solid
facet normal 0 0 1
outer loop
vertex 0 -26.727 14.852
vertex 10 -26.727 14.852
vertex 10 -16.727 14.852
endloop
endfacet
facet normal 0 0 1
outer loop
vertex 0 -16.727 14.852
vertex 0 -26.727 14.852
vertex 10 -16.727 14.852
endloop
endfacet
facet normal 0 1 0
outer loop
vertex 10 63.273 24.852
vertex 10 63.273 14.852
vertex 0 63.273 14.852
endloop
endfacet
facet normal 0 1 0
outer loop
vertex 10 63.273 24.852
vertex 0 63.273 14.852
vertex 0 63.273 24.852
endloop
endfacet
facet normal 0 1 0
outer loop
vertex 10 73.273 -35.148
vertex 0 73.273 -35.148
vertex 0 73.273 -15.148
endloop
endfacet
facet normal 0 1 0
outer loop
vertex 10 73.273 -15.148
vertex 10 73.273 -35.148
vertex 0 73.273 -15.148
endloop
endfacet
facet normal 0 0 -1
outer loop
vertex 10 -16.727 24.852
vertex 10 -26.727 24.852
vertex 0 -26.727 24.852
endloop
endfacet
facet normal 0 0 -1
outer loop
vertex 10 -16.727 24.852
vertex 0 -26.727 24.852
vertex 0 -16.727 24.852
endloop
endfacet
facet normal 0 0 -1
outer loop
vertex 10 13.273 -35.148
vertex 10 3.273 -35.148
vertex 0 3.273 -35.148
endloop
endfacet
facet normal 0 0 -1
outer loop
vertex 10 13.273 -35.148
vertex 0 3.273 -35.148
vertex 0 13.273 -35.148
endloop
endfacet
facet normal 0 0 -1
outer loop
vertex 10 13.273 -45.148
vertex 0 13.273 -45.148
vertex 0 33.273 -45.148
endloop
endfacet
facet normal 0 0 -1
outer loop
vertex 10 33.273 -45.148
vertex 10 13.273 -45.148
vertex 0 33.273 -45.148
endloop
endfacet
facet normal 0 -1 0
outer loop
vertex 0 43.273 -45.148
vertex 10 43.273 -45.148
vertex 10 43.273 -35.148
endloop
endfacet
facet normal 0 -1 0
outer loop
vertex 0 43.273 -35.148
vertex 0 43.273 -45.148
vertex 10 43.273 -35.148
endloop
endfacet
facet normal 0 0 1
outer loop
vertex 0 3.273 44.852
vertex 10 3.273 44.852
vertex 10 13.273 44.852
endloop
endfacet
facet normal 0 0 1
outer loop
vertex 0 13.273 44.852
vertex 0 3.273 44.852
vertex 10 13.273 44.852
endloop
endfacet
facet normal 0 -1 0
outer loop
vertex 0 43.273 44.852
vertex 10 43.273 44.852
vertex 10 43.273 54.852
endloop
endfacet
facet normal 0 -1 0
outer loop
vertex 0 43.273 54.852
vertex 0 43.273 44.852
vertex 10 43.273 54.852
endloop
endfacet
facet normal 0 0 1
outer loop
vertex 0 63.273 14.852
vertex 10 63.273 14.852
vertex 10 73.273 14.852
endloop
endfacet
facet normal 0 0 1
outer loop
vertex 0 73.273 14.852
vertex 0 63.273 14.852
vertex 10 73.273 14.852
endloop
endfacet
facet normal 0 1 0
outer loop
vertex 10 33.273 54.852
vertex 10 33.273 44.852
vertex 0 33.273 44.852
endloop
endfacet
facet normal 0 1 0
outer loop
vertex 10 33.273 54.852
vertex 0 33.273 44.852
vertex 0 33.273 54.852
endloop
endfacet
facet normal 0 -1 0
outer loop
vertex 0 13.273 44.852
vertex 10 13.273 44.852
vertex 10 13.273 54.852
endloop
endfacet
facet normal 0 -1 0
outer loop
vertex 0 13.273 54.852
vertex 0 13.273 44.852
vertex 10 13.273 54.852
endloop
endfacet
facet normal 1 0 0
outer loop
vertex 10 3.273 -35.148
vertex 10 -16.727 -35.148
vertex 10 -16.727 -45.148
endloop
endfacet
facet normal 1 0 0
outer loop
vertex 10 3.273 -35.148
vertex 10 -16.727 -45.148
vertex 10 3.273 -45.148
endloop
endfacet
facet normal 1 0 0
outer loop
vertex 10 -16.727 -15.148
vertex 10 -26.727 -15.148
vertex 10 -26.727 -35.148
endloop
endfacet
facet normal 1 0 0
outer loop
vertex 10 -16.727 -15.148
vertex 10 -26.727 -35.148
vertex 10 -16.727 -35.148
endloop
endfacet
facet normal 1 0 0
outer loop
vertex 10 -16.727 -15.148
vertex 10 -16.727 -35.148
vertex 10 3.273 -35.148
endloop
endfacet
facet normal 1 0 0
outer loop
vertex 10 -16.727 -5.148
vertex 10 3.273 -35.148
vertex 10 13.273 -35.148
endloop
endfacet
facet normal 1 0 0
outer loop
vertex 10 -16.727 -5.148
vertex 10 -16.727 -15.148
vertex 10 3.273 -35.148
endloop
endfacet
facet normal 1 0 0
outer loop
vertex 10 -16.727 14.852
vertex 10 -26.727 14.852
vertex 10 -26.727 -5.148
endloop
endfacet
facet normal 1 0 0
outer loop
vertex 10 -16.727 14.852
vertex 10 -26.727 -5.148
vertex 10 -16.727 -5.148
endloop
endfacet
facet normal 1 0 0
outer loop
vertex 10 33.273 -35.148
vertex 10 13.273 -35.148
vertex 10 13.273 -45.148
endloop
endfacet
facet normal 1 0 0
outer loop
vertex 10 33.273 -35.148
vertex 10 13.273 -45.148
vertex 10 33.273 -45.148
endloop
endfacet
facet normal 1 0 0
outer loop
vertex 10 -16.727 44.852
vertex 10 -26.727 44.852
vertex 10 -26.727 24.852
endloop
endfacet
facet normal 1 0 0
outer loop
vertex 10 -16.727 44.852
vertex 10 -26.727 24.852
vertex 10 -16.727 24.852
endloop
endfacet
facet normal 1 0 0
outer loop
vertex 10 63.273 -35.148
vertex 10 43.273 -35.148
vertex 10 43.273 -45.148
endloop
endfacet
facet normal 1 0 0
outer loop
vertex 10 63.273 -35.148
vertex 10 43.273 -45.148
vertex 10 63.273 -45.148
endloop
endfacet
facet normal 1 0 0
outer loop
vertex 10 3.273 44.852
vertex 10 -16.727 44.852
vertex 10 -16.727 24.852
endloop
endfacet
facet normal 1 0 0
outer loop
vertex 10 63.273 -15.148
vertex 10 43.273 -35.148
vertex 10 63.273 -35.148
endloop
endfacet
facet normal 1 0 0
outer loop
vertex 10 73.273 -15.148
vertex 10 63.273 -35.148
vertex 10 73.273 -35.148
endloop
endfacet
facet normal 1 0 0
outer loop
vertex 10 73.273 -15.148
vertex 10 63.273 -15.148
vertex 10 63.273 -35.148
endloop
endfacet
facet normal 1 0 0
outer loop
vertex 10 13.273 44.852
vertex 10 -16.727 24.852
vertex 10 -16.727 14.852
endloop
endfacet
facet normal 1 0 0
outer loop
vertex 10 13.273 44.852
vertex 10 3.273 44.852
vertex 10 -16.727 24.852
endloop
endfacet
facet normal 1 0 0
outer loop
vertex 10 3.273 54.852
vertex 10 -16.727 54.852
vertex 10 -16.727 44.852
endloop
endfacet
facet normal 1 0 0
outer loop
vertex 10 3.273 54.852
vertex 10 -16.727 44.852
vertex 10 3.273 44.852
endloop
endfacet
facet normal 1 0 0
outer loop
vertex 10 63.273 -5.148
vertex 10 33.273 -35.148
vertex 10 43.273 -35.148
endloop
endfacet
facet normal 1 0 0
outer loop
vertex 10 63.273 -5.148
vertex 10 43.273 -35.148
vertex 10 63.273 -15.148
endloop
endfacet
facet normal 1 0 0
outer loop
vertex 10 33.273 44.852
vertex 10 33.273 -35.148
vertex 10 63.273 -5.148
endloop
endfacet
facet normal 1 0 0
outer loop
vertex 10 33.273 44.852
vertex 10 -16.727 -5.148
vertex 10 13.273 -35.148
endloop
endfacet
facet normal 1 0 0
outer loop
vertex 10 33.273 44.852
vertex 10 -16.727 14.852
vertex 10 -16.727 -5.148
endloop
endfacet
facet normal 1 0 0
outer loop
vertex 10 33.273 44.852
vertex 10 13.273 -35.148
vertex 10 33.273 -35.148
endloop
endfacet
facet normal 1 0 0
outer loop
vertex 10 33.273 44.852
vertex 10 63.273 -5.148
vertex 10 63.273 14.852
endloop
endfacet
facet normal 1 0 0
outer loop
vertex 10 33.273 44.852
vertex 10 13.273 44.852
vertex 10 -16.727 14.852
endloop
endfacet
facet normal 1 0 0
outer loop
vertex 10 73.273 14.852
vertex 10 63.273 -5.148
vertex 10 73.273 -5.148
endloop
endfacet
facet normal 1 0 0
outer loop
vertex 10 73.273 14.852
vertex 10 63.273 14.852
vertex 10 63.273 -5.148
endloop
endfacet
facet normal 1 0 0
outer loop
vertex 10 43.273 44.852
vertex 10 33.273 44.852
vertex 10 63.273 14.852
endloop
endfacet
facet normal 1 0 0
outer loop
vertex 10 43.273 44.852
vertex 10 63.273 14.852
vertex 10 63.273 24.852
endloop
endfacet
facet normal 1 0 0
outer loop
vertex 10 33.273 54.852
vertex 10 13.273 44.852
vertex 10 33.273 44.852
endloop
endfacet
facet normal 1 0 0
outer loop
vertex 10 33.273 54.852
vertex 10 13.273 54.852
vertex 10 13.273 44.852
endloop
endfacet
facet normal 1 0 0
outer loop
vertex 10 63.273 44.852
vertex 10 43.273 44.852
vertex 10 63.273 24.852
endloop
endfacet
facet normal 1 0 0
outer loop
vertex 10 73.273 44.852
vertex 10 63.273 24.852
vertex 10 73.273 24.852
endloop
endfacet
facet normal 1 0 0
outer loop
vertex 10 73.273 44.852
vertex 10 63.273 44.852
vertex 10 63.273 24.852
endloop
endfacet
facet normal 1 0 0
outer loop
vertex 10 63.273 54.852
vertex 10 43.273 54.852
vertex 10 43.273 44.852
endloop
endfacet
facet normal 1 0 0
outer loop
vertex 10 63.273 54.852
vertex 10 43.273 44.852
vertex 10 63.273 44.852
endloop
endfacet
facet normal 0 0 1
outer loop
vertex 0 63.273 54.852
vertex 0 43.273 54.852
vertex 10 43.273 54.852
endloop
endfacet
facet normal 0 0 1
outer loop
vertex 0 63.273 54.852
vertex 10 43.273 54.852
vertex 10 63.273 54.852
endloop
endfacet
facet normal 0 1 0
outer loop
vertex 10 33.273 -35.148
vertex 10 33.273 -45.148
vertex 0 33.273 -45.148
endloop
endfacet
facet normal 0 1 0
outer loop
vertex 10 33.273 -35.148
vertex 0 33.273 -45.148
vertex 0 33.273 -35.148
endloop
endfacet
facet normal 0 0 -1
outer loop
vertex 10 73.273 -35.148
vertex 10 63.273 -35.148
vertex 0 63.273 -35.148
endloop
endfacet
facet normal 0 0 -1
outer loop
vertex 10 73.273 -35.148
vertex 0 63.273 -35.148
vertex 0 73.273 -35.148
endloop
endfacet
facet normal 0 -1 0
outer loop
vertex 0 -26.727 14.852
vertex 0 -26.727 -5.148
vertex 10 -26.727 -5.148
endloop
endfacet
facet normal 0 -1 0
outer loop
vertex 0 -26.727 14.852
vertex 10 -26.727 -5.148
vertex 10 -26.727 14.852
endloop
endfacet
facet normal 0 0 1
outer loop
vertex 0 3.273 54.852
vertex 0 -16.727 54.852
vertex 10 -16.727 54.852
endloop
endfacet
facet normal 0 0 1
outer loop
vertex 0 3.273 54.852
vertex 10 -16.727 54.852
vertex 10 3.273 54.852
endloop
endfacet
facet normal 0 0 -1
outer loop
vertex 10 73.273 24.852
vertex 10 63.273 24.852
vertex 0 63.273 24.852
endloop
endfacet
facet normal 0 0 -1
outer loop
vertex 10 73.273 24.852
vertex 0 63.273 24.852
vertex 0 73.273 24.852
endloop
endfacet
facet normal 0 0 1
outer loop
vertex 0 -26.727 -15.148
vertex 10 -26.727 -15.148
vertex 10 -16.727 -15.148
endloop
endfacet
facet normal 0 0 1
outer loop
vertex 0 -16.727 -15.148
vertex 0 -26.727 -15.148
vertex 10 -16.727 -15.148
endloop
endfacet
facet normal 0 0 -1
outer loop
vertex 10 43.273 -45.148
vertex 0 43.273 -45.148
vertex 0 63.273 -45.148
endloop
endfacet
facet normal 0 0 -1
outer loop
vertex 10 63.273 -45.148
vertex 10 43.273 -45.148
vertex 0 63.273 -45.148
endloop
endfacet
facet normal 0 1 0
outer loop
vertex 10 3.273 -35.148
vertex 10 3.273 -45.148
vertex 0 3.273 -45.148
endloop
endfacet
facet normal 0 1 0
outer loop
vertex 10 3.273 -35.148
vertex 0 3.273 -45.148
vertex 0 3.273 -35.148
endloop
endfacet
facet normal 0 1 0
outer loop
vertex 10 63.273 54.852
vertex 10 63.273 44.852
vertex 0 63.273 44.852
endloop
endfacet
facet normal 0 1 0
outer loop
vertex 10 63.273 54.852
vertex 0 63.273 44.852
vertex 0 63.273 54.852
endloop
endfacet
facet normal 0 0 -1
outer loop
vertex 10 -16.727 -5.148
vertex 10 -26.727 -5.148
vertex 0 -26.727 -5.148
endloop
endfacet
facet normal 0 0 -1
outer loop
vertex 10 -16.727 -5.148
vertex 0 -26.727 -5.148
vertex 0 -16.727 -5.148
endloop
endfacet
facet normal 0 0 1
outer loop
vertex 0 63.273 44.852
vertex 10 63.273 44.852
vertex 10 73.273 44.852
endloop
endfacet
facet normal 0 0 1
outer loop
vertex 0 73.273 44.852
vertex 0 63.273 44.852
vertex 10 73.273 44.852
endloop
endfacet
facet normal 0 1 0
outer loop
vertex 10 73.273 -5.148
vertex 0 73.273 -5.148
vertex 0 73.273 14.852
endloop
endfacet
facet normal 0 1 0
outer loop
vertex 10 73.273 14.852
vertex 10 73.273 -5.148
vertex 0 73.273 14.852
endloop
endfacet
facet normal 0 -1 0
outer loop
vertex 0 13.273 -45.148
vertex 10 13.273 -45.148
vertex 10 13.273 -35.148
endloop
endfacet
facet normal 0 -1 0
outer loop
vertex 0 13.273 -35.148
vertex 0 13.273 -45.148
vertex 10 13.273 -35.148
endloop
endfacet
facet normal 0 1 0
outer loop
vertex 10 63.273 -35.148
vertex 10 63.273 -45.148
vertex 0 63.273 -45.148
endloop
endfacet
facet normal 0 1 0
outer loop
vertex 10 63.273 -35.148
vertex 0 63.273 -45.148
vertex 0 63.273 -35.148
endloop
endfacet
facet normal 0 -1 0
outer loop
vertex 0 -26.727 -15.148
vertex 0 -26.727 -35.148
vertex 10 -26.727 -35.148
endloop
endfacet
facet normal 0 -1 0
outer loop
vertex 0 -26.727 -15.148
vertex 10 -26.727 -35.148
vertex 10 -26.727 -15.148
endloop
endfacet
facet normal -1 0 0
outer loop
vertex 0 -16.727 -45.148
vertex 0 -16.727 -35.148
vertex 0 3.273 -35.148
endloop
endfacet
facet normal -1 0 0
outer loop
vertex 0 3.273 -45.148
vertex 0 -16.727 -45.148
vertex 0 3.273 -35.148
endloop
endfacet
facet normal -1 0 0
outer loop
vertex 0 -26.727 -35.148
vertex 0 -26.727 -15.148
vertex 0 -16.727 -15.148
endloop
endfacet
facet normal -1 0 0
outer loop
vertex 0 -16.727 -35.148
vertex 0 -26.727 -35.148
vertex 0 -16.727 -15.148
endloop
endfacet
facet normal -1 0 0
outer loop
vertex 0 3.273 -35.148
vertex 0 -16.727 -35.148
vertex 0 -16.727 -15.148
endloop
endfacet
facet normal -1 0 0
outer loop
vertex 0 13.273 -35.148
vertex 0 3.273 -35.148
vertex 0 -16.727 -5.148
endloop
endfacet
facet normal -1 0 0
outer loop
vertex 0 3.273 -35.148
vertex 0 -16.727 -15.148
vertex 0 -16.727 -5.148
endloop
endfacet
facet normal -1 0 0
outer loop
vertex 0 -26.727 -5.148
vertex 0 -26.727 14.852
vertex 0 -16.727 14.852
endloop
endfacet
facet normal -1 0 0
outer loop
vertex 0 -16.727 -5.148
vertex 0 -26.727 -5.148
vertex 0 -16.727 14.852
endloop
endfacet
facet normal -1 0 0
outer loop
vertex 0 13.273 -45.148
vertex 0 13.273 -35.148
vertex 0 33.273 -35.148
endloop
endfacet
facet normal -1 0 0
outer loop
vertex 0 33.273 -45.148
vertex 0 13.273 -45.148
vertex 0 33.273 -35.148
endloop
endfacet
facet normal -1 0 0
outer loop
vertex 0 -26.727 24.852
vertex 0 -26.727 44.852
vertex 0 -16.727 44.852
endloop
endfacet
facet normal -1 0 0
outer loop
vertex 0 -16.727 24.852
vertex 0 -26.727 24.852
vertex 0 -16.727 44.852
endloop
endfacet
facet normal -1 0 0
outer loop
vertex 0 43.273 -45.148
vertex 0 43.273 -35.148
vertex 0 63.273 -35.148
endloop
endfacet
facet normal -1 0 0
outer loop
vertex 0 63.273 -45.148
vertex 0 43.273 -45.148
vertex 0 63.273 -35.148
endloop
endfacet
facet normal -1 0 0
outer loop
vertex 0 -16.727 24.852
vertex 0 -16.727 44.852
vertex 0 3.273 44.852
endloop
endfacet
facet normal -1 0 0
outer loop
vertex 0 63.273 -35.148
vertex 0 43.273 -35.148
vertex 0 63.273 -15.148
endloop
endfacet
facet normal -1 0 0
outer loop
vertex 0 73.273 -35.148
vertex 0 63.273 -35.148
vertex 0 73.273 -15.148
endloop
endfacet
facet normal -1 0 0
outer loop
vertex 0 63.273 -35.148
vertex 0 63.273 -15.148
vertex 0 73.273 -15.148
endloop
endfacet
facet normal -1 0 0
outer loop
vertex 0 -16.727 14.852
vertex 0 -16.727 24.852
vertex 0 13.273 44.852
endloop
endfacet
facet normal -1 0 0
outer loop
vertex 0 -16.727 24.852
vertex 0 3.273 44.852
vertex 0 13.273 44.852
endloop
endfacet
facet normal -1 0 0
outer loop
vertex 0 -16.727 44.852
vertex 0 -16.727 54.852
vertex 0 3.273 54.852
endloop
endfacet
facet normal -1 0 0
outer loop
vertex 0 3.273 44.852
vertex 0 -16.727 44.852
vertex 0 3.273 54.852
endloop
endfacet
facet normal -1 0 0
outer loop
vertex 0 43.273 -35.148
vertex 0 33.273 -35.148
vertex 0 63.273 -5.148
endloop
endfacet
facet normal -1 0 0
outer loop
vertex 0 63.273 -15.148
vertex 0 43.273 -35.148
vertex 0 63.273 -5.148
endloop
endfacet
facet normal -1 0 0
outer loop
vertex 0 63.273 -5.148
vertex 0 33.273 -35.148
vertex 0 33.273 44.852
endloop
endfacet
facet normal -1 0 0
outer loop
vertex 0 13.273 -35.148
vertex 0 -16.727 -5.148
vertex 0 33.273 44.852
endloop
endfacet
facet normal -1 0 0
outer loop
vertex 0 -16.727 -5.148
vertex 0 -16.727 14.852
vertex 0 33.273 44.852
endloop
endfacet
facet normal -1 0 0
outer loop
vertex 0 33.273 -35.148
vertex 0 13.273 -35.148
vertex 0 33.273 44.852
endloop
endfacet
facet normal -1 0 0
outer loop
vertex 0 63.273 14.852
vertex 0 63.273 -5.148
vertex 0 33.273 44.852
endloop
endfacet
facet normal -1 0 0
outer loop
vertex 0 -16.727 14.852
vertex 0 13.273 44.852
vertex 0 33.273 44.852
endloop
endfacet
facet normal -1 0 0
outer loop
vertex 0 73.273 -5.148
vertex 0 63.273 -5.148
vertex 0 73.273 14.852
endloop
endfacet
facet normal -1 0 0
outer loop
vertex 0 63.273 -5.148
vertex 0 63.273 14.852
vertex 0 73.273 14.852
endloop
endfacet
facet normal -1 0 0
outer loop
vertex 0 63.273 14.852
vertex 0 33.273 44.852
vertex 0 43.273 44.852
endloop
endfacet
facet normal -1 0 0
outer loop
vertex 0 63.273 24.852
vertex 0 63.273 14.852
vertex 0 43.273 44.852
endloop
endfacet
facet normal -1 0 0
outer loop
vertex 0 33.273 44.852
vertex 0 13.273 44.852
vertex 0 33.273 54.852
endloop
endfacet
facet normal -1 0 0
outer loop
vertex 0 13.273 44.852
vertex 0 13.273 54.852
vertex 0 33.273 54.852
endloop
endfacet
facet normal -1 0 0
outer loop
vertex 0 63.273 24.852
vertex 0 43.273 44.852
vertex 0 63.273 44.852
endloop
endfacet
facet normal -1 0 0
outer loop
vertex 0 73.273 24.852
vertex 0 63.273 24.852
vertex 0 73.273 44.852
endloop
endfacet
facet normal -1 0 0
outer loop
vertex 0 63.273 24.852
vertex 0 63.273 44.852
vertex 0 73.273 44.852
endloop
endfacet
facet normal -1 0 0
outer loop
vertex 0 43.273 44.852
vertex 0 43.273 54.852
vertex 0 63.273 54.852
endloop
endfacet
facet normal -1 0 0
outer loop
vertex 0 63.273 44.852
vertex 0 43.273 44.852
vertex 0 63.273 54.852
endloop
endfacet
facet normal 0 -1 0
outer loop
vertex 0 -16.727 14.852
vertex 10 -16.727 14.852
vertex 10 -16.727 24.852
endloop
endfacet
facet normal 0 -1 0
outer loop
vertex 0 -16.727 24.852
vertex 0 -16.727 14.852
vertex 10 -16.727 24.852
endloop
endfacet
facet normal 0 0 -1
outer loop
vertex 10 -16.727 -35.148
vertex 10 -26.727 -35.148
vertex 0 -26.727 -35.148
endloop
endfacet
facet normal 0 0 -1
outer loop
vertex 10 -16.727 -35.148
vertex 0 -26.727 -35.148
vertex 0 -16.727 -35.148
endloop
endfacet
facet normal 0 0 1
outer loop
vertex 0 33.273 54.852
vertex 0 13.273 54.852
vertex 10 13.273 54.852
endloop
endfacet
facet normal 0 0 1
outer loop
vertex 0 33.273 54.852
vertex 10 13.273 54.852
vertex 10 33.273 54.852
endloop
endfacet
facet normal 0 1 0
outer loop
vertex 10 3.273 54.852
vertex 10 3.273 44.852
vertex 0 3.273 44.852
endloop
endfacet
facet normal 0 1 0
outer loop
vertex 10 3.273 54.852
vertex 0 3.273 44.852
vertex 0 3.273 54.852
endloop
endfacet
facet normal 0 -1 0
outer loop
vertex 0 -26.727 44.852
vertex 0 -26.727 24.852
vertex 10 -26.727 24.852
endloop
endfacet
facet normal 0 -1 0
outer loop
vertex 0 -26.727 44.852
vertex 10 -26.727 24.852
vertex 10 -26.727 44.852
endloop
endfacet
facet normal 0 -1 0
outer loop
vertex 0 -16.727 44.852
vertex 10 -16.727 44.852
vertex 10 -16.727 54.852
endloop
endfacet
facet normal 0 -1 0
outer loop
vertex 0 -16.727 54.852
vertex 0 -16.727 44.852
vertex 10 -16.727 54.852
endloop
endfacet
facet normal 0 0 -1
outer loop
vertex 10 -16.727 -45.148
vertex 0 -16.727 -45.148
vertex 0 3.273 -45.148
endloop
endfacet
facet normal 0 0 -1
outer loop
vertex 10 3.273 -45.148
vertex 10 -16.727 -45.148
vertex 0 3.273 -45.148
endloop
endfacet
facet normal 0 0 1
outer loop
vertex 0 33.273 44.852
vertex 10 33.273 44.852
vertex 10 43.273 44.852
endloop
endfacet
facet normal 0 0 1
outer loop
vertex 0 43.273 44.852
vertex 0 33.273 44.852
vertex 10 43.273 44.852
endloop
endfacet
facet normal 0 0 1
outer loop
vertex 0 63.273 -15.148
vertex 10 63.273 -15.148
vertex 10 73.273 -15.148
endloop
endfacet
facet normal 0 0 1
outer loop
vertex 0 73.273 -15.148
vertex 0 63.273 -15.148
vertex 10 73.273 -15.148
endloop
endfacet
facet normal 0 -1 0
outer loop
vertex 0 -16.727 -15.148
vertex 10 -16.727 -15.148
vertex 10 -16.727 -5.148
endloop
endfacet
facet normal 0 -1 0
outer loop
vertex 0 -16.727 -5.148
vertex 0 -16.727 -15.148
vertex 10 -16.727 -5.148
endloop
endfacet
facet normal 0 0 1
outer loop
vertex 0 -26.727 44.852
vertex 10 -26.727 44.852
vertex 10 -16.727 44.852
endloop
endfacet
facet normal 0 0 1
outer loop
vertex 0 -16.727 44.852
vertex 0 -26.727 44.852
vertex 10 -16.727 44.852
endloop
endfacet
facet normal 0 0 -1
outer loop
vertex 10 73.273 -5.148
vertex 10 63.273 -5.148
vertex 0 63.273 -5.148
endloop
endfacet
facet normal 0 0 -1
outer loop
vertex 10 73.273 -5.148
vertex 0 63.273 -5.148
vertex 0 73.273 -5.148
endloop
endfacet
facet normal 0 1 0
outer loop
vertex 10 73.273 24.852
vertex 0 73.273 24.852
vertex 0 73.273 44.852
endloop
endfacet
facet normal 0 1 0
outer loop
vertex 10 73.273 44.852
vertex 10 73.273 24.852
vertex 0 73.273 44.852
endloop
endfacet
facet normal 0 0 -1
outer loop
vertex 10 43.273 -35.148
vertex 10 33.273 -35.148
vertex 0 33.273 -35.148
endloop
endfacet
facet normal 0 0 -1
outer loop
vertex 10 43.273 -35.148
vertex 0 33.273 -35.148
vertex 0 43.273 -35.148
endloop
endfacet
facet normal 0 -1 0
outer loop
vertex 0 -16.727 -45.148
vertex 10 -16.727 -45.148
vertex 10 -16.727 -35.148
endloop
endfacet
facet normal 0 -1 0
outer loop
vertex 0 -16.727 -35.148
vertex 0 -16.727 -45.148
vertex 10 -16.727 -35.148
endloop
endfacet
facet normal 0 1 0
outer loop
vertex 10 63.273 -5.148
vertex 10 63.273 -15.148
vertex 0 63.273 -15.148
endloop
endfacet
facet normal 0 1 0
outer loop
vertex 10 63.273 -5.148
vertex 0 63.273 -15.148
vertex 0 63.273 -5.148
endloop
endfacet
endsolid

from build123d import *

# Parameters (mm, degrees)
F0_W      = 100
F0_H      = 100
F1_DEPTH  = 10
F2_W      = 10
F2_H      = 10
F3_DEPTH  = 10
F4_W      = 10
F4_H      = 10
F5_DEPTH  = 25
F6_W      = 10
F6_H      = 10
F7_DEPTH  = 10
F8_W      = 10
F8_H      = 10
F9_DEPTH  = 10
F10_W     = 10
F10_H     = 10
F11_DEPTH = 10
F12_W     = 10
F12_H     = 10
F13_DEPTH = 10
F14_W     = 10
F14_H     = 10
F15_DEPTH = 20
F16_W     = 10
F16_H     = 10
F17_DEPTH = 10
F18_W     = 10
F18_H     = 10
F19_DEPTH = 10
F20_W     = 10
F20_H     = 10
F21_DEPTH = 10
F22_W     = 10
F22_H     = 10
F23_DEPTH = 10
F24_W     = 10
F24_H     = 10
F25_DEPTH = 10


with BuildPart() as f1:
    # F0 (on Right) → F1 (new body)
    with BuildSketch(Plane.YZ):
        with Locations((23.273025, 4.85197)):
            Rectangle(F0_W, F0_H)
    extrude(amount=F1_DEPTH)

    # F2 (on face) → F3 (cut)
    with BuildSketch(Plane.YZ.offset(10)):
        with Locations((-21.726975, 49.85197)):
            Rectangle(F2_W, F2_H)
    extrude(amount=-F3_DEPTH, mode=Mode.SUBTRACT)

    # F4 (on face) → F5 (cut)
    with BuildSketch(Plane.YZ.offset(10)):
        with Locations((-21.726975, 19.85197)):
            Rectangle(F4_W, F4_H)
    extrude(amount=-F5_DEPTH, mode=Mode.SUBTRACT)

    # F6 (on face) → F7 (cut)
    with BuildSketch(Plane.YZ.offset(10)):
        with Locations((-21.726975, -10.14803)):
            Rectangle(F6_W, F6_H)
    extrude(amount=-F7_DEPTH, mode=Mode.SUBTRACT)

    # F8 (on face) → F9 (cut)
    with BuildSketch(Plane.YZ.offset(10)):
        with Locations((-21.726975, -40.14803)):
            Rectangle(F8_W, F8_H)
    extrude(amount=-F9_DEPTH, mode=Mode.SUBTRACT)

    # F10 (on face) → F11 (cut)
    with BuildSketch(Plane.YZ.offset(10)):
        with Locations((8.273025, -40.14803)):
            Rectangle(F10_W, F10_H)
    extrude(amount=-F11_DEPTH, mode=Mode.SUBTRACT)

    # F12 (on face) → F13 (cut)
    with BuildSketch(Plane.YZ.offset(10)):
        with Locations((38.273025, -40.14803)):
            Rectangle(F12_W, F12_H)
    extrude(amount=-F13_DEPTH, mode=Mode.SUBTRACT)

    # F14 (on face) → F15 (cut)
    with BuildSketch(Plane.YZ.offset(10)):
        with Locations((68.273025, -40.14803)):
            Rectangle(F14_W, F14_H)
    extrude(amount=-F15_DEPTH, mode=Mode.SUBTRACT)

    # F16 (on face) → F17 (cut)
    with BuildSketch(Plane.YZ.offset(10)):
        with Locations((68.273025, -10.14803)):
            Rectangle(F16_W, F16_H)
    extrude(amount=-F17_DEPTH, mode=Mode.SUBTRACT)

    # F18 (on face) → F19 (cut)
    with BuildSketch(Plane.YZ.offset(10)):
        with Locations((68.273025, 19.85197)):
            Rectangle(F18_W, F18_H)
    extrude(amount=-F19_DEPTH, mode=Mode.SUBTRACT)

    # F20 (on face) → F21 (cut)
    with BuildSketch(Plane.YZ.offset(10)):
        with Locations((68.273025, 49.85197)):
            Rectangle(F20_W, F20_H)
    extrude(amount=-F21_DEPTH, mode=Mode.SUBTRACT)

    # F22 (on face) → F23 (cut)
    with BuildSketch(Plane.YZ.offset(10)):
        with Locations((38.273025, 49.85197)):
            Rectangle(F22_W, F22_H)
    extrude(amount=-F23_DEPTH, mode=Mode.SUBTRACT)

    # F24 (on face) → F25 (cut)
    with BuildSketch(Plane.YZ.offset(10)):
        with Locations((8.273025, 49.85197)):
            Rectangle(F24_W, F24_H)
    extrude(amount=-F25_DEPTH, mode=Mode.SUBTRACT)


solid = f1.part
